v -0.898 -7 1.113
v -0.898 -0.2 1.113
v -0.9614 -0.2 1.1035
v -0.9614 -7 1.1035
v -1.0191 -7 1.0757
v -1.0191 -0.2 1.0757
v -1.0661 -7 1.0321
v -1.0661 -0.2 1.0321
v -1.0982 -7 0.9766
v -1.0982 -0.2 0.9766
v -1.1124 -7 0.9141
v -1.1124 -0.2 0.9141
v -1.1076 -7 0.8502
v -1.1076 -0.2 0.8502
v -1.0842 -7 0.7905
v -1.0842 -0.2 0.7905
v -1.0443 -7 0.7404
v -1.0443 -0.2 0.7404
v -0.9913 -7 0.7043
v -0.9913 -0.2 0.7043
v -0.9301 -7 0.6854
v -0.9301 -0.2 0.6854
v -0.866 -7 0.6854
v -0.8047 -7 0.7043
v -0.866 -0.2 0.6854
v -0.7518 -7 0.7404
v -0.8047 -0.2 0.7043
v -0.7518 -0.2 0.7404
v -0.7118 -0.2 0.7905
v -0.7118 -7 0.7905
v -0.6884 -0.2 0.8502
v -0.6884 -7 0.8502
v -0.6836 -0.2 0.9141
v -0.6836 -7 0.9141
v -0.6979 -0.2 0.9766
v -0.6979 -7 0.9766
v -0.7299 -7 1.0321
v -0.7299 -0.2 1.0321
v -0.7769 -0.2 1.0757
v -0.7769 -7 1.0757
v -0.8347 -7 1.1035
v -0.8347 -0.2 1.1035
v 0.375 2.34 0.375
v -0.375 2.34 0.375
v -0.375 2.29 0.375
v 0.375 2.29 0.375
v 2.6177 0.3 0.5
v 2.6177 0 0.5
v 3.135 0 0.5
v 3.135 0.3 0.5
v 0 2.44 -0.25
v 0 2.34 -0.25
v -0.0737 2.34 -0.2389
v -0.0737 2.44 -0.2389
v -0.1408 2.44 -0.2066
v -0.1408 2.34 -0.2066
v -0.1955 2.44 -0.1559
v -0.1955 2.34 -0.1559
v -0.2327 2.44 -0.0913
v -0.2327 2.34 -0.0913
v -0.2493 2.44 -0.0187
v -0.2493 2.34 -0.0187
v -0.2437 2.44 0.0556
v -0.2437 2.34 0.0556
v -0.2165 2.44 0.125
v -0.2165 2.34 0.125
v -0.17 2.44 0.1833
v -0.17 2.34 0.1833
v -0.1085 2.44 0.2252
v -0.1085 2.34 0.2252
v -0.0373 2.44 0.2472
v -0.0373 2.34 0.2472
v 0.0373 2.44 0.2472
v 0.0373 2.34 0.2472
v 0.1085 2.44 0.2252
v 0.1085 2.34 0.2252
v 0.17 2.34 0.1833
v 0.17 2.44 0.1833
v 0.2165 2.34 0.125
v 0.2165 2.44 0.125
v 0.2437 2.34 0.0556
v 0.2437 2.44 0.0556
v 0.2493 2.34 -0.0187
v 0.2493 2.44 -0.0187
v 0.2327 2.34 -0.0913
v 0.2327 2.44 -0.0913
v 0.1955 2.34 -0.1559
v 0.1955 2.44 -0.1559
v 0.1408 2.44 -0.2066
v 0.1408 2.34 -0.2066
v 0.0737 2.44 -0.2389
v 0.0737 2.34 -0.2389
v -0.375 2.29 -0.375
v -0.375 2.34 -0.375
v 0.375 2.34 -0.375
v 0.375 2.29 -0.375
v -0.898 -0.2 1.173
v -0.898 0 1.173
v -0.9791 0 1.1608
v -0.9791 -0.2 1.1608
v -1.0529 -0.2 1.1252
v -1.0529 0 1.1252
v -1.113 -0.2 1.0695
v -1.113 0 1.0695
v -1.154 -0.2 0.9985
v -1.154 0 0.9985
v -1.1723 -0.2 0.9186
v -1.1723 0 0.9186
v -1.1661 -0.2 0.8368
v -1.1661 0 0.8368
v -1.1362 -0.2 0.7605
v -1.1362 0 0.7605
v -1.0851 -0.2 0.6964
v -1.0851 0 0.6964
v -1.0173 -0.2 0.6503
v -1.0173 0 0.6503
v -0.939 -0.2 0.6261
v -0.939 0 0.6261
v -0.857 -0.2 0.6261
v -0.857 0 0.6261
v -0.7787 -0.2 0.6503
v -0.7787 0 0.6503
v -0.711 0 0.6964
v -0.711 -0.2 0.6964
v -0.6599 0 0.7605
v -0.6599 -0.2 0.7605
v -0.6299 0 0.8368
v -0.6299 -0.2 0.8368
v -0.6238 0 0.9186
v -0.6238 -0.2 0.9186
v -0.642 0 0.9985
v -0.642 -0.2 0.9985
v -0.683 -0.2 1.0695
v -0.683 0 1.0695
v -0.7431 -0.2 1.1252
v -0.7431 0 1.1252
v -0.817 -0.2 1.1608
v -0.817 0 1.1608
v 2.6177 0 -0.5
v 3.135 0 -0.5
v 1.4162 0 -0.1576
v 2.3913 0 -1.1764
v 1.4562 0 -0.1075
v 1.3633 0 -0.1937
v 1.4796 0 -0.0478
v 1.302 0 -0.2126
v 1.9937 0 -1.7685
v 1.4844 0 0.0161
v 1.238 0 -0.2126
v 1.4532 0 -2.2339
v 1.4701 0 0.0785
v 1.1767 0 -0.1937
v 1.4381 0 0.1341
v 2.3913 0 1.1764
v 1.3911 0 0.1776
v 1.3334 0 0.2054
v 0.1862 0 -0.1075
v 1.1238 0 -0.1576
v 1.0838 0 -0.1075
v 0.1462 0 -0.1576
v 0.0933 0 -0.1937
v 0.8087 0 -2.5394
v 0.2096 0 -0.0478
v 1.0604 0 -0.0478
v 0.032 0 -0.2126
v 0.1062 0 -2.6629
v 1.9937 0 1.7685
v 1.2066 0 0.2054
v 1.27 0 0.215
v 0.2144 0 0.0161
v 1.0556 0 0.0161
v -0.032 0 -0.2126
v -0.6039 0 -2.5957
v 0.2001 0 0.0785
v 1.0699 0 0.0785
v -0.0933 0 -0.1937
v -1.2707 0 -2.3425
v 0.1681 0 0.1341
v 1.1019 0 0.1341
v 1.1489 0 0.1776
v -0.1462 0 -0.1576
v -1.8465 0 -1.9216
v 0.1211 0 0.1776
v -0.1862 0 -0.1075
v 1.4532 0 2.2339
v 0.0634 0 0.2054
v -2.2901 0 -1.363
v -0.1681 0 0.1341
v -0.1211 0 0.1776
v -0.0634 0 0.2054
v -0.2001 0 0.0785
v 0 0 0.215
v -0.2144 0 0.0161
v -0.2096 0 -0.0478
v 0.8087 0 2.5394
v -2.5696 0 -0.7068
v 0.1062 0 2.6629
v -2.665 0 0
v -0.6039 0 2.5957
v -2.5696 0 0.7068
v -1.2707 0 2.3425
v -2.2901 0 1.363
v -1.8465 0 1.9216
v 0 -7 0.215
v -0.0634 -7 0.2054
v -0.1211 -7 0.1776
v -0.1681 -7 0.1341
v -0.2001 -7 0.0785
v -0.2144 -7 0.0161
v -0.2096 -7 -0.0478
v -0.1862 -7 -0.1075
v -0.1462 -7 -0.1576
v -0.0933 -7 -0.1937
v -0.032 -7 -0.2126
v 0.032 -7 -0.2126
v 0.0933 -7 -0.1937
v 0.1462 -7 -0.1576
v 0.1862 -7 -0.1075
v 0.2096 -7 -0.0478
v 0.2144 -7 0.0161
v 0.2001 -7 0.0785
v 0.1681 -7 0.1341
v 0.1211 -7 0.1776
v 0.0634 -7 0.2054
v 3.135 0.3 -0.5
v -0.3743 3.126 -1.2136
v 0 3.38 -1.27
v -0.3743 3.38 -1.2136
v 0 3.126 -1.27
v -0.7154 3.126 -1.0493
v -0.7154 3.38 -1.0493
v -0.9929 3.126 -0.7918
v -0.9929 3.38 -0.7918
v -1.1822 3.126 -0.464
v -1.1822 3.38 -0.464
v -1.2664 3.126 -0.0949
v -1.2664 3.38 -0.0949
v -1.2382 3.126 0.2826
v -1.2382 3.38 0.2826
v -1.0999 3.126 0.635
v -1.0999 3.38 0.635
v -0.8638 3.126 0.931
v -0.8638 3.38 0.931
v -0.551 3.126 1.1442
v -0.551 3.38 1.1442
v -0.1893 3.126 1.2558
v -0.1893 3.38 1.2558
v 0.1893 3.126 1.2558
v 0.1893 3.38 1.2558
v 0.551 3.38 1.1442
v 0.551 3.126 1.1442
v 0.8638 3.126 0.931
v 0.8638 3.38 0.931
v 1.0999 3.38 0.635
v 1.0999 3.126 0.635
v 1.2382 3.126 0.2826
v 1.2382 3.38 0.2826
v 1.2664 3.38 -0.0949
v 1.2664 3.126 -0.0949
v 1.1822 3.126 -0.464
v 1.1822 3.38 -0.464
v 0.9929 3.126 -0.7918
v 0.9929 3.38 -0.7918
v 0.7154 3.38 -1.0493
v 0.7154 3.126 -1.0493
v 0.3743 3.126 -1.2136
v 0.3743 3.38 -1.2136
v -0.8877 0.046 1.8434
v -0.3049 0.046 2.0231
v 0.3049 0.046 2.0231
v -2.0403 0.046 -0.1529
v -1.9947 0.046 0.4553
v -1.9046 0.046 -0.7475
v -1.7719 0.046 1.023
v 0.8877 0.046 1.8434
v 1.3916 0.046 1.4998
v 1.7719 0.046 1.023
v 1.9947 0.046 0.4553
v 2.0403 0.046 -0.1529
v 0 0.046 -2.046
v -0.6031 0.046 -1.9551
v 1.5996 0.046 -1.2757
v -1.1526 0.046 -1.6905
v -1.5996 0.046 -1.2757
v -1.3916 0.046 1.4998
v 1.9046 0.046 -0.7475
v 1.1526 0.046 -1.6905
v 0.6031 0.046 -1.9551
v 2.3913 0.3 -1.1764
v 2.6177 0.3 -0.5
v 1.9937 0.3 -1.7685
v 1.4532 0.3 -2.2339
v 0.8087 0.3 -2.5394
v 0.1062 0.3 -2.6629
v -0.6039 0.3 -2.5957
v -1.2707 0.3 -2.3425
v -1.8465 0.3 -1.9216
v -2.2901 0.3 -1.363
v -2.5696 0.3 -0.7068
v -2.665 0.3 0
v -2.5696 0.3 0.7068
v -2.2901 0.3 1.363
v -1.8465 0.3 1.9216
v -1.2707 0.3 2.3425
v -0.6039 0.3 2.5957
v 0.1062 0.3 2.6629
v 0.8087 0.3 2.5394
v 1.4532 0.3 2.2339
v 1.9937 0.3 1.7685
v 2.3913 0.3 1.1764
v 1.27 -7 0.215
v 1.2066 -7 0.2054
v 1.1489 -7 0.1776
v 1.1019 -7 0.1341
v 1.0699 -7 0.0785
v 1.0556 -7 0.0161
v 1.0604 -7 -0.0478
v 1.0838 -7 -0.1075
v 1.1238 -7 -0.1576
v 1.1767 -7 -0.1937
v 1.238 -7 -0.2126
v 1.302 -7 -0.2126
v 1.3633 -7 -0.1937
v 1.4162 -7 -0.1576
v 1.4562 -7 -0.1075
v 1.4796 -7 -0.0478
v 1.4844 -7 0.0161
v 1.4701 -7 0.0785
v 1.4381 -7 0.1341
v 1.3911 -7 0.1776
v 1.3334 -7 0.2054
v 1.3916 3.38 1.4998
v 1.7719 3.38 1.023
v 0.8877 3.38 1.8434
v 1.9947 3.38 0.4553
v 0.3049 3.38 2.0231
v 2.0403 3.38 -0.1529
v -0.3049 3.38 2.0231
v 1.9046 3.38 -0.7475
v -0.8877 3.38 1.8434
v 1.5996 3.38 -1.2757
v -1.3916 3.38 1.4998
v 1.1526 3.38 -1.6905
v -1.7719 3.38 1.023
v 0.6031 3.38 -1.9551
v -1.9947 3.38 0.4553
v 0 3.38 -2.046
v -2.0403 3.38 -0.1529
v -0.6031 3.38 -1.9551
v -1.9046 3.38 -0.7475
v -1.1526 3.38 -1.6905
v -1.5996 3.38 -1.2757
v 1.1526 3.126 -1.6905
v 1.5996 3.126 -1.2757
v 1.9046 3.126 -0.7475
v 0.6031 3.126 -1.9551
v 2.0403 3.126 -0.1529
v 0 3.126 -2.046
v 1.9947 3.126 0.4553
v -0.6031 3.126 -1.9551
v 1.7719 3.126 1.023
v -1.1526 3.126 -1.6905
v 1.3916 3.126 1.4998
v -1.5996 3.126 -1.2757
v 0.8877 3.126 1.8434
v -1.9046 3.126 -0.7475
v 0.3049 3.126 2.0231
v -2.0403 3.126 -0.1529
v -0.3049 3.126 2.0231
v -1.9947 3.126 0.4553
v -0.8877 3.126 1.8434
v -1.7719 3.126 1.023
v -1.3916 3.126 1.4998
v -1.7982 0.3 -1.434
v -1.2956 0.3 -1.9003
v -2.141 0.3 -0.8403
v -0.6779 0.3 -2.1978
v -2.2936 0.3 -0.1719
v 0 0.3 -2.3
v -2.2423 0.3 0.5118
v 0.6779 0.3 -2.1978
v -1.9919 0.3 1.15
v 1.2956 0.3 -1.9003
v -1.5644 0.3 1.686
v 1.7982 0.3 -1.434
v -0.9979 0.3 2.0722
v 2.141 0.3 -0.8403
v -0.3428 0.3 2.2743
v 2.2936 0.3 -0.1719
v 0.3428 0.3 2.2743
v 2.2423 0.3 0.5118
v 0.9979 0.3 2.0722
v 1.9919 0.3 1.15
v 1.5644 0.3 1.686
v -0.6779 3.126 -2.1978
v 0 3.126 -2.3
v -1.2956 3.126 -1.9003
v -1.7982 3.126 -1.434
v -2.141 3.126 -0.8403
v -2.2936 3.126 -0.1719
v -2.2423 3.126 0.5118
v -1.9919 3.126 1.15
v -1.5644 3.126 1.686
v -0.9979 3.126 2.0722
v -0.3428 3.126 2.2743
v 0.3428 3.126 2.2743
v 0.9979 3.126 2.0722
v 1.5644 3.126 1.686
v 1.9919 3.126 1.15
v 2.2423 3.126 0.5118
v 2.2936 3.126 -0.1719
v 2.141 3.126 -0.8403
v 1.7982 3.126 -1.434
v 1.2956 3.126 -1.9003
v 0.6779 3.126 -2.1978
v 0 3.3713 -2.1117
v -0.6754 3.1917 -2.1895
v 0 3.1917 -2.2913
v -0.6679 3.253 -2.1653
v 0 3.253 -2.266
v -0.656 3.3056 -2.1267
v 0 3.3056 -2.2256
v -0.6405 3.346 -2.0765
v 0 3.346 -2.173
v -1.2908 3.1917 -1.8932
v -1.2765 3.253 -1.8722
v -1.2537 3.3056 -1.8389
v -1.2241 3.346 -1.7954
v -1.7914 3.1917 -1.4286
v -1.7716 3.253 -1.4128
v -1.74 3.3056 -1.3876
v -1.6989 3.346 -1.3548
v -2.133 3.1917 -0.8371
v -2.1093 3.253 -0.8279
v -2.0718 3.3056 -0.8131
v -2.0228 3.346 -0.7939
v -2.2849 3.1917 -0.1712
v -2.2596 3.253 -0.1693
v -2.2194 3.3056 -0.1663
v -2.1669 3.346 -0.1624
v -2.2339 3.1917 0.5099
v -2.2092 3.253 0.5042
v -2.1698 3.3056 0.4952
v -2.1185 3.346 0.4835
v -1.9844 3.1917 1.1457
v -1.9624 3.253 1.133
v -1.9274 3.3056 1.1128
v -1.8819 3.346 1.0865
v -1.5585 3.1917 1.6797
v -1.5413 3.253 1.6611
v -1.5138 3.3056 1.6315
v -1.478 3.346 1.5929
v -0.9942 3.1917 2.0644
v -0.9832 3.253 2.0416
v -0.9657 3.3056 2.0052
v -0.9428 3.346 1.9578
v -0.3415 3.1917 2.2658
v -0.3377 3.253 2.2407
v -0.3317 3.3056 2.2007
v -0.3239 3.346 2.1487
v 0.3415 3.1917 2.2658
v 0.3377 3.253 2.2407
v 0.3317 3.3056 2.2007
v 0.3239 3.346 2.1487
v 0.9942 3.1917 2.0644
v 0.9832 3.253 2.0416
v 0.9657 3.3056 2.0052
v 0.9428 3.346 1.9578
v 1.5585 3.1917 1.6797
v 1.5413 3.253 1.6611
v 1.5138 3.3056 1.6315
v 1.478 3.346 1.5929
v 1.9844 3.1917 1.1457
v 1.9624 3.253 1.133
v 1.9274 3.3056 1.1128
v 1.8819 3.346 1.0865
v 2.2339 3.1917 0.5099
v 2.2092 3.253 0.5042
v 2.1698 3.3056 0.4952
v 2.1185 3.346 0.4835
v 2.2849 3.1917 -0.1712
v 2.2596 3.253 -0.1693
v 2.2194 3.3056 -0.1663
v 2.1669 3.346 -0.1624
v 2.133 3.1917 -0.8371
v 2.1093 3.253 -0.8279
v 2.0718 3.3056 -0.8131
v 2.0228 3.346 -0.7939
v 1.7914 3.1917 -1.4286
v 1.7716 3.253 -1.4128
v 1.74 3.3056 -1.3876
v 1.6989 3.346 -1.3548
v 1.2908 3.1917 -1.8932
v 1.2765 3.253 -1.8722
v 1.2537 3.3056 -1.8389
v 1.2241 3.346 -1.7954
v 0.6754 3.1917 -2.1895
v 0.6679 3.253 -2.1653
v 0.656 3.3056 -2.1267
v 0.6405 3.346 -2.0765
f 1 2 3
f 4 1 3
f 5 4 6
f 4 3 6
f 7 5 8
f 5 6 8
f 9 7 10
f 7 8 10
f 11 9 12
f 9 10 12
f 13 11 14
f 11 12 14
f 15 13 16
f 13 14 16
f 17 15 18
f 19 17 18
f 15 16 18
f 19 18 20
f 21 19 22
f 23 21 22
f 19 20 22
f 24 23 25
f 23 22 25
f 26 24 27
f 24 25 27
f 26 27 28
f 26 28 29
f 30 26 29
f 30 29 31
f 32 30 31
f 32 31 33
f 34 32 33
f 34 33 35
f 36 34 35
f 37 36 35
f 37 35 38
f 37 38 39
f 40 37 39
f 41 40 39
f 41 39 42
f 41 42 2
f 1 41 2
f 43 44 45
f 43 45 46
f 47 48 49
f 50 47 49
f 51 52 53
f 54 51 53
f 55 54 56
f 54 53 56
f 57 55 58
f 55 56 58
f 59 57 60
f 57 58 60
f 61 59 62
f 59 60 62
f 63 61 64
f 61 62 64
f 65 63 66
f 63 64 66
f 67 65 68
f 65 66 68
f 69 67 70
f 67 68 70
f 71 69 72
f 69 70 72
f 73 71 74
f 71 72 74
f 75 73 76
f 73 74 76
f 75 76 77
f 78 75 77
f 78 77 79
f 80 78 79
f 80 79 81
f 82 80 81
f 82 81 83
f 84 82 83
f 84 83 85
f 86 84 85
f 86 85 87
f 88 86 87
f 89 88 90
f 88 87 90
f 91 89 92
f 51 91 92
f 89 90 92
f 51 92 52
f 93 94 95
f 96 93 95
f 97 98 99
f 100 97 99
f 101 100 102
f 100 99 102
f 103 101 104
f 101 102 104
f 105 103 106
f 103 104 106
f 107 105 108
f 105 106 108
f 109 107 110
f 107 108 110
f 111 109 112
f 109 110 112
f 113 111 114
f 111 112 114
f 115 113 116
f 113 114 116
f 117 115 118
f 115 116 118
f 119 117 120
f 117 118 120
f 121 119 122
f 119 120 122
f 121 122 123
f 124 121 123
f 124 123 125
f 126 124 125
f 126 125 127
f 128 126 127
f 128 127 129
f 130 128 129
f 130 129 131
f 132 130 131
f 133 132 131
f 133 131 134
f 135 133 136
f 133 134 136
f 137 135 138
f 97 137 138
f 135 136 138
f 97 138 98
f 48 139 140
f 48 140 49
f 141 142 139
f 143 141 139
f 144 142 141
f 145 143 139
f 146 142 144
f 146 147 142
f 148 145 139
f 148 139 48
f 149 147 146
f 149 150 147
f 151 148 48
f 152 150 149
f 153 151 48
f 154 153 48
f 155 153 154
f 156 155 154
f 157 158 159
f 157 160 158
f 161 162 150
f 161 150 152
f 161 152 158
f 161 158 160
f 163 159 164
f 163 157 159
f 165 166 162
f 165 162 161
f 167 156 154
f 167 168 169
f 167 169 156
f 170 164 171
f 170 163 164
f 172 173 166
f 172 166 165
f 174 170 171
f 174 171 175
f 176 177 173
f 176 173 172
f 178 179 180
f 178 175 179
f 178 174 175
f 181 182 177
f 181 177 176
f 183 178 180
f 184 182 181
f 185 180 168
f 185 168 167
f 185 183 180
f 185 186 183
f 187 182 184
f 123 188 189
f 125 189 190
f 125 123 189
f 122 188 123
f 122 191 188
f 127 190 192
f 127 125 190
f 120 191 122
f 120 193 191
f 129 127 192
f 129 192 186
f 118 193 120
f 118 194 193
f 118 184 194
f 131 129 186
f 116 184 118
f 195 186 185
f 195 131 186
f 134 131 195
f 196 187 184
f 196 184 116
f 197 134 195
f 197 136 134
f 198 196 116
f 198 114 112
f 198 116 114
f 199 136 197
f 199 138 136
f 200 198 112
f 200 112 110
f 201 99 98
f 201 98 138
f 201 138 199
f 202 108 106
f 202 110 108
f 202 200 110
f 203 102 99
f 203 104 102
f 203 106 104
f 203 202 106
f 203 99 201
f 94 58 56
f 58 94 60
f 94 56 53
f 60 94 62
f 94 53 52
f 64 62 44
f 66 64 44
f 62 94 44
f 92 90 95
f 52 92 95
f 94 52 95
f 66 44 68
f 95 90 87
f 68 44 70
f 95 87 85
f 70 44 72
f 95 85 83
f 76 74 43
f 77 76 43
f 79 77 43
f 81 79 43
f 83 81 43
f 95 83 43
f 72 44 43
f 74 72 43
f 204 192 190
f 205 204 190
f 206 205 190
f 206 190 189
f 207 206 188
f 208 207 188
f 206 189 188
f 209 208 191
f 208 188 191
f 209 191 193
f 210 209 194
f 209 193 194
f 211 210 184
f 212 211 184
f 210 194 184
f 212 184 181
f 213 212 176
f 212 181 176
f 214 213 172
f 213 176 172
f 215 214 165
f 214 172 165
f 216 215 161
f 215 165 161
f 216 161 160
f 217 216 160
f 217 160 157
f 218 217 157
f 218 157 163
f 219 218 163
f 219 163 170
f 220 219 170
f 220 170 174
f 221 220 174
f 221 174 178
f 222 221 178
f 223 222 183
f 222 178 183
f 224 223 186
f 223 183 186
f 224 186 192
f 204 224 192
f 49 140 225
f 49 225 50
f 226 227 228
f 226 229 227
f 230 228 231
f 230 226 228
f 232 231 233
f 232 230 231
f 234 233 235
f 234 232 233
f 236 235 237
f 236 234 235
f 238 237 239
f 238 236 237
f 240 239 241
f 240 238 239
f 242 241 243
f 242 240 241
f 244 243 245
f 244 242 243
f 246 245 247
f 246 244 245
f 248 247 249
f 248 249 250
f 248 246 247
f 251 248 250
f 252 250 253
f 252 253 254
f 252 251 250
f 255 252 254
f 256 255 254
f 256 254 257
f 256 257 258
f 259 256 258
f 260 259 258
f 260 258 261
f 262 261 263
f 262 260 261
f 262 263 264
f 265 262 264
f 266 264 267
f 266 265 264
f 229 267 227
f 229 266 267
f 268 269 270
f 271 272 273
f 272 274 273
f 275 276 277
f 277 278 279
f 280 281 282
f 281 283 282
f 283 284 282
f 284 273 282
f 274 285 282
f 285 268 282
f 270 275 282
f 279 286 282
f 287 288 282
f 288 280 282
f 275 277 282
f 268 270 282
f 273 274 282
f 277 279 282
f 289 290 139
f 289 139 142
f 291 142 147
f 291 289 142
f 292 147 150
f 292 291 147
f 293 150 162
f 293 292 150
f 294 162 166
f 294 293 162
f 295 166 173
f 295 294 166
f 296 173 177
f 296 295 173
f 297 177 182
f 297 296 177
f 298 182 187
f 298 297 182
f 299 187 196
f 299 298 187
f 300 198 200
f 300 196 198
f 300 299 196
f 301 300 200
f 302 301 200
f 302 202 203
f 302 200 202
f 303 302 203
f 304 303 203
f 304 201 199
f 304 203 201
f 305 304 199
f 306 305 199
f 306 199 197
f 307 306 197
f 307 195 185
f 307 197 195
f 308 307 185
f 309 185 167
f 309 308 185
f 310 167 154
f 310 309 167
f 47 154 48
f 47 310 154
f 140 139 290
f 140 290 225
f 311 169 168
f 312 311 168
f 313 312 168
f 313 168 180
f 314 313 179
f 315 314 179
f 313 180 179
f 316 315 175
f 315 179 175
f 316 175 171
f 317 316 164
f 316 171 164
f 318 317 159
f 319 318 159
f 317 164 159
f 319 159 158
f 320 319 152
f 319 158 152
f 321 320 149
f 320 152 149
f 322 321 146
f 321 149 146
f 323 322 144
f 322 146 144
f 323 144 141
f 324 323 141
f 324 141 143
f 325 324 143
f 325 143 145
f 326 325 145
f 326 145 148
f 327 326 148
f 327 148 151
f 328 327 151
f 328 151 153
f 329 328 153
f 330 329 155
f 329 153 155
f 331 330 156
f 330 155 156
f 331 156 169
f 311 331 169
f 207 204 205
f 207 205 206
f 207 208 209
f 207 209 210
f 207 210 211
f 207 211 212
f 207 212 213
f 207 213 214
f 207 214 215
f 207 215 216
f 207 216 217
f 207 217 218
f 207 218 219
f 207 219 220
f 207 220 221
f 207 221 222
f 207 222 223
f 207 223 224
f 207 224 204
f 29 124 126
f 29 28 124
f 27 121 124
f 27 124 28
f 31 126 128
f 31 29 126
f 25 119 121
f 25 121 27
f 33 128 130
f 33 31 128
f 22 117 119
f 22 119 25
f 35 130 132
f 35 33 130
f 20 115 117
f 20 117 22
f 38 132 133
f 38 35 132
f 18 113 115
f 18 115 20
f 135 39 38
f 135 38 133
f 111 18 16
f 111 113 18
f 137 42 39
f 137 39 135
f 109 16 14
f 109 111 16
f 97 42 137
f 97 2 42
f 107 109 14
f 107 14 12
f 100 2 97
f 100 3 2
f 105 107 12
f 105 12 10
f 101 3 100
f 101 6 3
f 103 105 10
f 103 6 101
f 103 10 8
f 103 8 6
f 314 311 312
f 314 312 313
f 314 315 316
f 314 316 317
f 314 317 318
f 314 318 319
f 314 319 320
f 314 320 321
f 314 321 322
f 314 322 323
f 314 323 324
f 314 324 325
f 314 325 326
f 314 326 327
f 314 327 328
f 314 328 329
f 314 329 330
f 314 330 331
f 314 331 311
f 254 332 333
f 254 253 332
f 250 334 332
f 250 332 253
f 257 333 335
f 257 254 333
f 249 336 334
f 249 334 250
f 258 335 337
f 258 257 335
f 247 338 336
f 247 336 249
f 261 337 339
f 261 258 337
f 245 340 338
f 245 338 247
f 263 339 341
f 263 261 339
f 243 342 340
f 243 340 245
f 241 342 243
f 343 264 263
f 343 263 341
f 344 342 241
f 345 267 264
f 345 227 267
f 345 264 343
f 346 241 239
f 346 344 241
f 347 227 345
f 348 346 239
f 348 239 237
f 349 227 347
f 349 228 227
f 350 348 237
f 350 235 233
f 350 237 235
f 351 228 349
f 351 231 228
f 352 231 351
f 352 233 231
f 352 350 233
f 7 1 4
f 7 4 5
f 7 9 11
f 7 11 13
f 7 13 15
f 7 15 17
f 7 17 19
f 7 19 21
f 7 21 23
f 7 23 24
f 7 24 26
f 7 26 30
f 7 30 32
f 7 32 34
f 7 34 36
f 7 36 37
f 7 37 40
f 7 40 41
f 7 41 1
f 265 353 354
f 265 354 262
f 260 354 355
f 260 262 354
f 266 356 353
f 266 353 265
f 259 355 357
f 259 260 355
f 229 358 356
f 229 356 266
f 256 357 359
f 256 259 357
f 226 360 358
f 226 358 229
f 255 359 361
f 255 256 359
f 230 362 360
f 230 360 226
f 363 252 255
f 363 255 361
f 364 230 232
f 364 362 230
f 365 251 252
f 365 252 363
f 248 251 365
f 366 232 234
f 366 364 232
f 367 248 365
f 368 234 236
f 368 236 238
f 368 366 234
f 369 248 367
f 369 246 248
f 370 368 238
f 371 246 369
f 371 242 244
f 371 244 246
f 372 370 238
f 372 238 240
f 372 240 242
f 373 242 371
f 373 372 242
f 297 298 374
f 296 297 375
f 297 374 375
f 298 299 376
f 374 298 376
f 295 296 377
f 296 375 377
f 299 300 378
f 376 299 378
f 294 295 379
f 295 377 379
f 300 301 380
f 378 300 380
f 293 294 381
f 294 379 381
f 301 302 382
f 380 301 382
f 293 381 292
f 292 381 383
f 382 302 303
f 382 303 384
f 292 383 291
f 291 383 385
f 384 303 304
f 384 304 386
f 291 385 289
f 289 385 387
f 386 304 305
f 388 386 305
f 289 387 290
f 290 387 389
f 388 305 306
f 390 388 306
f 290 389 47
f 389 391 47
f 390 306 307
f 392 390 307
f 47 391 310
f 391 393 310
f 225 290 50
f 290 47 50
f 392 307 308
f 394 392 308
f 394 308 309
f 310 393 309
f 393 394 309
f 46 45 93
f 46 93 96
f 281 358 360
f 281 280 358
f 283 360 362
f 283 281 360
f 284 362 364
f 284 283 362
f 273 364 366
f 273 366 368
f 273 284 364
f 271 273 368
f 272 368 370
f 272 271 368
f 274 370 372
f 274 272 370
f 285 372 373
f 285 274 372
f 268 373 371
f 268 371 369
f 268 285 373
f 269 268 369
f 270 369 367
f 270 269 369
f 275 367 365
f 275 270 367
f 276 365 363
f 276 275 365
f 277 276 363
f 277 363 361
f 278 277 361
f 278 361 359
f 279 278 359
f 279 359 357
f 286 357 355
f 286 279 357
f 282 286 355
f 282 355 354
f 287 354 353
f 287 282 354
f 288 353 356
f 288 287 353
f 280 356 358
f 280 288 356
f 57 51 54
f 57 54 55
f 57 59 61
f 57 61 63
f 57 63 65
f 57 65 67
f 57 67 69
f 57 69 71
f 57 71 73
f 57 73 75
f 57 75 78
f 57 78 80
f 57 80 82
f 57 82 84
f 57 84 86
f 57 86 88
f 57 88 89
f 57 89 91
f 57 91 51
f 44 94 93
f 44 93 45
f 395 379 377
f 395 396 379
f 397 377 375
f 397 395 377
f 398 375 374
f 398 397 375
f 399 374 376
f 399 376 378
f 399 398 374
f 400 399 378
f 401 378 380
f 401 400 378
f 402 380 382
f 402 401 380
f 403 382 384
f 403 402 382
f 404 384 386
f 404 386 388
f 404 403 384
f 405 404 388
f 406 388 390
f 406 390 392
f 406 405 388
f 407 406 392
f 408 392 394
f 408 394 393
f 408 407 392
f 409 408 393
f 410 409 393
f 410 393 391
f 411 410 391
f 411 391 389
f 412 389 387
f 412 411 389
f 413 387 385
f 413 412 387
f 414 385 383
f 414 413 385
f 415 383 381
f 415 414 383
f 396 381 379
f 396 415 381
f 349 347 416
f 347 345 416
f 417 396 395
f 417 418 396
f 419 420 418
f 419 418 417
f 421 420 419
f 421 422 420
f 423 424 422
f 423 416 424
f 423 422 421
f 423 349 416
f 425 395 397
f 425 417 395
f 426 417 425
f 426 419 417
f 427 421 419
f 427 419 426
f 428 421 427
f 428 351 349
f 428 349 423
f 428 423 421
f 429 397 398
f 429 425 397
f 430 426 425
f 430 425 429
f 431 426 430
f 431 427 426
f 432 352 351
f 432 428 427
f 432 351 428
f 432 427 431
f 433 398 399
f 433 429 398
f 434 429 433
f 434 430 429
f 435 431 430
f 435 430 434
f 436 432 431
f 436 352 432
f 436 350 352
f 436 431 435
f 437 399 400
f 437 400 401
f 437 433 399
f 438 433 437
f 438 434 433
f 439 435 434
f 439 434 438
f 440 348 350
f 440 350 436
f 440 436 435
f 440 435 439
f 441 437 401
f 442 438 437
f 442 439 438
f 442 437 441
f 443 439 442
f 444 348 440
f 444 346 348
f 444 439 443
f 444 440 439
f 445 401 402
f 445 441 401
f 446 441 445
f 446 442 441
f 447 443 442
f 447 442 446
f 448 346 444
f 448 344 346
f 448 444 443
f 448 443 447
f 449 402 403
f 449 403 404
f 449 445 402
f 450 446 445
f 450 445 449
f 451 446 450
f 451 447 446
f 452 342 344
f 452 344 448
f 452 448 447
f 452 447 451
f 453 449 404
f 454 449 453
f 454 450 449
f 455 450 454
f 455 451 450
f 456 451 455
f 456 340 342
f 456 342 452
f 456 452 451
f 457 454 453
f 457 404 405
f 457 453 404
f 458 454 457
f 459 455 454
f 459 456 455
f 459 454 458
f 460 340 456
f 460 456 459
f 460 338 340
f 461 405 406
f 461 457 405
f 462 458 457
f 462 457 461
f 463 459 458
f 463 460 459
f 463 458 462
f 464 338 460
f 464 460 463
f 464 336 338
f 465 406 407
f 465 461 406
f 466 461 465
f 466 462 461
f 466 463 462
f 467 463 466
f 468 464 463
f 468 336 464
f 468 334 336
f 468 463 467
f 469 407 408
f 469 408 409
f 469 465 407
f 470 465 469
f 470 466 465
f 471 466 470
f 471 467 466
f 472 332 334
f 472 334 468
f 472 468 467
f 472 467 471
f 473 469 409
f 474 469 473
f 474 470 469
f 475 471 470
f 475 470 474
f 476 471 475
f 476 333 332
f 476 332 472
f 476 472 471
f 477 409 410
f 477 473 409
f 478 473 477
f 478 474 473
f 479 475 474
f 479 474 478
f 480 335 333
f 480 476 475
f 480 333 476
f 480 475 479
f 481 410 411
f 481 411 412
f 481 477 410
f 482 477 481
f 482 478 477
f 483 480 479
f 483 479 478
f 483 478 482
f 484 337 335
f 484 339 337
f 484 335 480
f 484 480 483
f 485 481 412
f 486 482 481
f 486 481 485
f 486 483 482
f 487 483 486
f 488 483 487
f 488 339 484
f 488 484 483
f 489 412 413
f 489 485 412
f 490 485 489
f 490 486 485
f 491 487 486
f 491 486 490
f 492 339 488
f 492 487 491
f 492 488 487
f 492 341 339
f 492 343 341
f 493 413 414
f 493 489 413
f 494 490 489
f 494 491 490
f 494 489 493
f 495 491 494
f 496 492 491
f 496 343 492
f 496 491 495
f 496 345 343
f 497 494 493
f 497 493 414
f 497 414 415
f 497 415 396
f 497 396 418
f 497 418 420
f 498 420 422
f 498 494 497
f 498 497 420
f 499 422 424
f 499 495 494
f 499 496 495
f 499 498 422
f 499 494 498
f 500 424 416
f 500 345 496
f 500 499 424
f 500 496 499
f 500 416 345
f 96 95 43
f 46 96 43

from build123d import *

# Parameters (mm, degrees)
SKETCH2_R           = 2.665
BOSS_EXTRUDE1_DEPTH = 0.046
BOSS_EXTRUDE2_START = -2.34
SKETCH3_W           = 0.75
SKETCH3_H           = 0.75
BOSS_EXTRUDE2_DEPTH = 0.05
SKETCH8_R           = 0.25
BOSS_EXTRUDE6_DEPTH = 0.1
SKETCH5_R           = 0.215
BOSS_EXTRUDE4_DEPTH = 7
SKETCH7_R           = 0.275
BOSS_EXTRUDE5_DEPTH = 0.2
SKETCH10_W          = 0.517324504
SKETCH10_H          = 1
BOSS_EXTRUDE7_DEPTH = 0.3


with BuildPart() as part:
    # Sketch1 → Revolve-Thin2 (revolve)
    with BuildSketch(Plane.XY, mode=Mode.PRIVATE) as revolve_thin2_sk:
        with BuildLine():
            Line((2.665, 0), (2.665, 0.3))
            Line((2.665, 0.3), (2.3, 0.3))
            Line((2.3, 0.3), (2.3, 3.126))
            ThreePointArc((2.3, 3.126), (2.225605122, 3.305605122), (2.046, 3.38))
            Line((2.046, 3.38), (1.27, 3.38))
            Line((1.27, 3.38), (1.27, 3.126))
            Line((1.27, 3.126), (2.046, 3.126))
            Line((2.046, 3.126), (2.046, 0.046))
            Line((2.046, 0.046), (2.411, 0.046))
            Line((2.411, 0.046), (2.411, 0))
            Line((2.411, 0), (2.665, 0))
        make_face()
    revolve(revolve_thin2_sk.sketch.rotate(Axis((0, 0, 0), (0, 1, 0)), 90), axis=Axis((0, 0, 0), (0, 1, 0)))  # turned: the seam where the file's is

    # Sketch2 → Boss-Extrude1 (add)
    with BuildSketch(Plane.XZ):
        with Locations(Location((0, 0, 0), (0, 0, 270))):  # turned: the seam where the file's is
            Circle(SKETCH2_R)
    extrude(amount=-BOSS_EXTRUDE1_DEPTH)

    # Sketch5 → Boss-Extrude4 (add)
    with BuildSketch(Plane.XZ):
        with Locations(Location((0, 0, 0), (0, 0, 90))):  # turned: the seam where the file's is
            Circle(SKETCH5_R)
        with Locations(Location((1.27, 0, 0), (0, 0, 90))):  # turned: the seam where the file's is
            Circle(SKETCH5_R)
        with Locations(Location((-0.898025612, 0.898025612, 0), (0, 0, 90))):  # turned: the seam where the file's is
            Circle(SKETCH5_R)
    extrude(amount=BOSS_EXTRUDE4_DEPTH)

    # Sketch7 → Boss-Extrude5 (add)
    with BuildSketch(Plane.XZ):
        with Locations(Location((-0.898025612, 0.898025612, 0), (0, 0, 90))):  # turned: the seam where the file's is
            Circle(SKETCH7_R)
    extrude(amount=BOSS_EXTRUDE5_DEPTH)

    # Sketch10 → Boss-Extrude7 (add)
    with BuildSketch(Plane.XZ):
        with Locations((2.876337748, 0)):
            Rectangle(SKETCH10_W, SKETCH10_H)
    extrude(amount=-BOSS_EXTRUDE7_DEPTH)


with BuildPart() as body_2:
    # Sketch3 → Boss-Extrude2 (new body)
    with BuildSketch(Plane.XZ.offset(BOSS_EXTRUDE2_START)):
        Rectangle(SKETCH3_W, SKETCH3_H)
    extrude(amount=BOSS_EXTRUDE2_DEPTH)

    # Sketch8 → Boss-Extrude6 (add)
    with BuildSketch(Plane(origin=(0, 2.34, 0), x_dir=(-1, 0, 0), z_dir=(0, 1, 0))):
        with Locations(Location((0, 0, 0), (0, 0, 270))):  # turned: the seam where the file's is
            Circle(SKETCH8_R)
    extrude(amount=BOSS_EXTRUDE6_DEPTH)


solid = Compound([part.part, body_2.part])
